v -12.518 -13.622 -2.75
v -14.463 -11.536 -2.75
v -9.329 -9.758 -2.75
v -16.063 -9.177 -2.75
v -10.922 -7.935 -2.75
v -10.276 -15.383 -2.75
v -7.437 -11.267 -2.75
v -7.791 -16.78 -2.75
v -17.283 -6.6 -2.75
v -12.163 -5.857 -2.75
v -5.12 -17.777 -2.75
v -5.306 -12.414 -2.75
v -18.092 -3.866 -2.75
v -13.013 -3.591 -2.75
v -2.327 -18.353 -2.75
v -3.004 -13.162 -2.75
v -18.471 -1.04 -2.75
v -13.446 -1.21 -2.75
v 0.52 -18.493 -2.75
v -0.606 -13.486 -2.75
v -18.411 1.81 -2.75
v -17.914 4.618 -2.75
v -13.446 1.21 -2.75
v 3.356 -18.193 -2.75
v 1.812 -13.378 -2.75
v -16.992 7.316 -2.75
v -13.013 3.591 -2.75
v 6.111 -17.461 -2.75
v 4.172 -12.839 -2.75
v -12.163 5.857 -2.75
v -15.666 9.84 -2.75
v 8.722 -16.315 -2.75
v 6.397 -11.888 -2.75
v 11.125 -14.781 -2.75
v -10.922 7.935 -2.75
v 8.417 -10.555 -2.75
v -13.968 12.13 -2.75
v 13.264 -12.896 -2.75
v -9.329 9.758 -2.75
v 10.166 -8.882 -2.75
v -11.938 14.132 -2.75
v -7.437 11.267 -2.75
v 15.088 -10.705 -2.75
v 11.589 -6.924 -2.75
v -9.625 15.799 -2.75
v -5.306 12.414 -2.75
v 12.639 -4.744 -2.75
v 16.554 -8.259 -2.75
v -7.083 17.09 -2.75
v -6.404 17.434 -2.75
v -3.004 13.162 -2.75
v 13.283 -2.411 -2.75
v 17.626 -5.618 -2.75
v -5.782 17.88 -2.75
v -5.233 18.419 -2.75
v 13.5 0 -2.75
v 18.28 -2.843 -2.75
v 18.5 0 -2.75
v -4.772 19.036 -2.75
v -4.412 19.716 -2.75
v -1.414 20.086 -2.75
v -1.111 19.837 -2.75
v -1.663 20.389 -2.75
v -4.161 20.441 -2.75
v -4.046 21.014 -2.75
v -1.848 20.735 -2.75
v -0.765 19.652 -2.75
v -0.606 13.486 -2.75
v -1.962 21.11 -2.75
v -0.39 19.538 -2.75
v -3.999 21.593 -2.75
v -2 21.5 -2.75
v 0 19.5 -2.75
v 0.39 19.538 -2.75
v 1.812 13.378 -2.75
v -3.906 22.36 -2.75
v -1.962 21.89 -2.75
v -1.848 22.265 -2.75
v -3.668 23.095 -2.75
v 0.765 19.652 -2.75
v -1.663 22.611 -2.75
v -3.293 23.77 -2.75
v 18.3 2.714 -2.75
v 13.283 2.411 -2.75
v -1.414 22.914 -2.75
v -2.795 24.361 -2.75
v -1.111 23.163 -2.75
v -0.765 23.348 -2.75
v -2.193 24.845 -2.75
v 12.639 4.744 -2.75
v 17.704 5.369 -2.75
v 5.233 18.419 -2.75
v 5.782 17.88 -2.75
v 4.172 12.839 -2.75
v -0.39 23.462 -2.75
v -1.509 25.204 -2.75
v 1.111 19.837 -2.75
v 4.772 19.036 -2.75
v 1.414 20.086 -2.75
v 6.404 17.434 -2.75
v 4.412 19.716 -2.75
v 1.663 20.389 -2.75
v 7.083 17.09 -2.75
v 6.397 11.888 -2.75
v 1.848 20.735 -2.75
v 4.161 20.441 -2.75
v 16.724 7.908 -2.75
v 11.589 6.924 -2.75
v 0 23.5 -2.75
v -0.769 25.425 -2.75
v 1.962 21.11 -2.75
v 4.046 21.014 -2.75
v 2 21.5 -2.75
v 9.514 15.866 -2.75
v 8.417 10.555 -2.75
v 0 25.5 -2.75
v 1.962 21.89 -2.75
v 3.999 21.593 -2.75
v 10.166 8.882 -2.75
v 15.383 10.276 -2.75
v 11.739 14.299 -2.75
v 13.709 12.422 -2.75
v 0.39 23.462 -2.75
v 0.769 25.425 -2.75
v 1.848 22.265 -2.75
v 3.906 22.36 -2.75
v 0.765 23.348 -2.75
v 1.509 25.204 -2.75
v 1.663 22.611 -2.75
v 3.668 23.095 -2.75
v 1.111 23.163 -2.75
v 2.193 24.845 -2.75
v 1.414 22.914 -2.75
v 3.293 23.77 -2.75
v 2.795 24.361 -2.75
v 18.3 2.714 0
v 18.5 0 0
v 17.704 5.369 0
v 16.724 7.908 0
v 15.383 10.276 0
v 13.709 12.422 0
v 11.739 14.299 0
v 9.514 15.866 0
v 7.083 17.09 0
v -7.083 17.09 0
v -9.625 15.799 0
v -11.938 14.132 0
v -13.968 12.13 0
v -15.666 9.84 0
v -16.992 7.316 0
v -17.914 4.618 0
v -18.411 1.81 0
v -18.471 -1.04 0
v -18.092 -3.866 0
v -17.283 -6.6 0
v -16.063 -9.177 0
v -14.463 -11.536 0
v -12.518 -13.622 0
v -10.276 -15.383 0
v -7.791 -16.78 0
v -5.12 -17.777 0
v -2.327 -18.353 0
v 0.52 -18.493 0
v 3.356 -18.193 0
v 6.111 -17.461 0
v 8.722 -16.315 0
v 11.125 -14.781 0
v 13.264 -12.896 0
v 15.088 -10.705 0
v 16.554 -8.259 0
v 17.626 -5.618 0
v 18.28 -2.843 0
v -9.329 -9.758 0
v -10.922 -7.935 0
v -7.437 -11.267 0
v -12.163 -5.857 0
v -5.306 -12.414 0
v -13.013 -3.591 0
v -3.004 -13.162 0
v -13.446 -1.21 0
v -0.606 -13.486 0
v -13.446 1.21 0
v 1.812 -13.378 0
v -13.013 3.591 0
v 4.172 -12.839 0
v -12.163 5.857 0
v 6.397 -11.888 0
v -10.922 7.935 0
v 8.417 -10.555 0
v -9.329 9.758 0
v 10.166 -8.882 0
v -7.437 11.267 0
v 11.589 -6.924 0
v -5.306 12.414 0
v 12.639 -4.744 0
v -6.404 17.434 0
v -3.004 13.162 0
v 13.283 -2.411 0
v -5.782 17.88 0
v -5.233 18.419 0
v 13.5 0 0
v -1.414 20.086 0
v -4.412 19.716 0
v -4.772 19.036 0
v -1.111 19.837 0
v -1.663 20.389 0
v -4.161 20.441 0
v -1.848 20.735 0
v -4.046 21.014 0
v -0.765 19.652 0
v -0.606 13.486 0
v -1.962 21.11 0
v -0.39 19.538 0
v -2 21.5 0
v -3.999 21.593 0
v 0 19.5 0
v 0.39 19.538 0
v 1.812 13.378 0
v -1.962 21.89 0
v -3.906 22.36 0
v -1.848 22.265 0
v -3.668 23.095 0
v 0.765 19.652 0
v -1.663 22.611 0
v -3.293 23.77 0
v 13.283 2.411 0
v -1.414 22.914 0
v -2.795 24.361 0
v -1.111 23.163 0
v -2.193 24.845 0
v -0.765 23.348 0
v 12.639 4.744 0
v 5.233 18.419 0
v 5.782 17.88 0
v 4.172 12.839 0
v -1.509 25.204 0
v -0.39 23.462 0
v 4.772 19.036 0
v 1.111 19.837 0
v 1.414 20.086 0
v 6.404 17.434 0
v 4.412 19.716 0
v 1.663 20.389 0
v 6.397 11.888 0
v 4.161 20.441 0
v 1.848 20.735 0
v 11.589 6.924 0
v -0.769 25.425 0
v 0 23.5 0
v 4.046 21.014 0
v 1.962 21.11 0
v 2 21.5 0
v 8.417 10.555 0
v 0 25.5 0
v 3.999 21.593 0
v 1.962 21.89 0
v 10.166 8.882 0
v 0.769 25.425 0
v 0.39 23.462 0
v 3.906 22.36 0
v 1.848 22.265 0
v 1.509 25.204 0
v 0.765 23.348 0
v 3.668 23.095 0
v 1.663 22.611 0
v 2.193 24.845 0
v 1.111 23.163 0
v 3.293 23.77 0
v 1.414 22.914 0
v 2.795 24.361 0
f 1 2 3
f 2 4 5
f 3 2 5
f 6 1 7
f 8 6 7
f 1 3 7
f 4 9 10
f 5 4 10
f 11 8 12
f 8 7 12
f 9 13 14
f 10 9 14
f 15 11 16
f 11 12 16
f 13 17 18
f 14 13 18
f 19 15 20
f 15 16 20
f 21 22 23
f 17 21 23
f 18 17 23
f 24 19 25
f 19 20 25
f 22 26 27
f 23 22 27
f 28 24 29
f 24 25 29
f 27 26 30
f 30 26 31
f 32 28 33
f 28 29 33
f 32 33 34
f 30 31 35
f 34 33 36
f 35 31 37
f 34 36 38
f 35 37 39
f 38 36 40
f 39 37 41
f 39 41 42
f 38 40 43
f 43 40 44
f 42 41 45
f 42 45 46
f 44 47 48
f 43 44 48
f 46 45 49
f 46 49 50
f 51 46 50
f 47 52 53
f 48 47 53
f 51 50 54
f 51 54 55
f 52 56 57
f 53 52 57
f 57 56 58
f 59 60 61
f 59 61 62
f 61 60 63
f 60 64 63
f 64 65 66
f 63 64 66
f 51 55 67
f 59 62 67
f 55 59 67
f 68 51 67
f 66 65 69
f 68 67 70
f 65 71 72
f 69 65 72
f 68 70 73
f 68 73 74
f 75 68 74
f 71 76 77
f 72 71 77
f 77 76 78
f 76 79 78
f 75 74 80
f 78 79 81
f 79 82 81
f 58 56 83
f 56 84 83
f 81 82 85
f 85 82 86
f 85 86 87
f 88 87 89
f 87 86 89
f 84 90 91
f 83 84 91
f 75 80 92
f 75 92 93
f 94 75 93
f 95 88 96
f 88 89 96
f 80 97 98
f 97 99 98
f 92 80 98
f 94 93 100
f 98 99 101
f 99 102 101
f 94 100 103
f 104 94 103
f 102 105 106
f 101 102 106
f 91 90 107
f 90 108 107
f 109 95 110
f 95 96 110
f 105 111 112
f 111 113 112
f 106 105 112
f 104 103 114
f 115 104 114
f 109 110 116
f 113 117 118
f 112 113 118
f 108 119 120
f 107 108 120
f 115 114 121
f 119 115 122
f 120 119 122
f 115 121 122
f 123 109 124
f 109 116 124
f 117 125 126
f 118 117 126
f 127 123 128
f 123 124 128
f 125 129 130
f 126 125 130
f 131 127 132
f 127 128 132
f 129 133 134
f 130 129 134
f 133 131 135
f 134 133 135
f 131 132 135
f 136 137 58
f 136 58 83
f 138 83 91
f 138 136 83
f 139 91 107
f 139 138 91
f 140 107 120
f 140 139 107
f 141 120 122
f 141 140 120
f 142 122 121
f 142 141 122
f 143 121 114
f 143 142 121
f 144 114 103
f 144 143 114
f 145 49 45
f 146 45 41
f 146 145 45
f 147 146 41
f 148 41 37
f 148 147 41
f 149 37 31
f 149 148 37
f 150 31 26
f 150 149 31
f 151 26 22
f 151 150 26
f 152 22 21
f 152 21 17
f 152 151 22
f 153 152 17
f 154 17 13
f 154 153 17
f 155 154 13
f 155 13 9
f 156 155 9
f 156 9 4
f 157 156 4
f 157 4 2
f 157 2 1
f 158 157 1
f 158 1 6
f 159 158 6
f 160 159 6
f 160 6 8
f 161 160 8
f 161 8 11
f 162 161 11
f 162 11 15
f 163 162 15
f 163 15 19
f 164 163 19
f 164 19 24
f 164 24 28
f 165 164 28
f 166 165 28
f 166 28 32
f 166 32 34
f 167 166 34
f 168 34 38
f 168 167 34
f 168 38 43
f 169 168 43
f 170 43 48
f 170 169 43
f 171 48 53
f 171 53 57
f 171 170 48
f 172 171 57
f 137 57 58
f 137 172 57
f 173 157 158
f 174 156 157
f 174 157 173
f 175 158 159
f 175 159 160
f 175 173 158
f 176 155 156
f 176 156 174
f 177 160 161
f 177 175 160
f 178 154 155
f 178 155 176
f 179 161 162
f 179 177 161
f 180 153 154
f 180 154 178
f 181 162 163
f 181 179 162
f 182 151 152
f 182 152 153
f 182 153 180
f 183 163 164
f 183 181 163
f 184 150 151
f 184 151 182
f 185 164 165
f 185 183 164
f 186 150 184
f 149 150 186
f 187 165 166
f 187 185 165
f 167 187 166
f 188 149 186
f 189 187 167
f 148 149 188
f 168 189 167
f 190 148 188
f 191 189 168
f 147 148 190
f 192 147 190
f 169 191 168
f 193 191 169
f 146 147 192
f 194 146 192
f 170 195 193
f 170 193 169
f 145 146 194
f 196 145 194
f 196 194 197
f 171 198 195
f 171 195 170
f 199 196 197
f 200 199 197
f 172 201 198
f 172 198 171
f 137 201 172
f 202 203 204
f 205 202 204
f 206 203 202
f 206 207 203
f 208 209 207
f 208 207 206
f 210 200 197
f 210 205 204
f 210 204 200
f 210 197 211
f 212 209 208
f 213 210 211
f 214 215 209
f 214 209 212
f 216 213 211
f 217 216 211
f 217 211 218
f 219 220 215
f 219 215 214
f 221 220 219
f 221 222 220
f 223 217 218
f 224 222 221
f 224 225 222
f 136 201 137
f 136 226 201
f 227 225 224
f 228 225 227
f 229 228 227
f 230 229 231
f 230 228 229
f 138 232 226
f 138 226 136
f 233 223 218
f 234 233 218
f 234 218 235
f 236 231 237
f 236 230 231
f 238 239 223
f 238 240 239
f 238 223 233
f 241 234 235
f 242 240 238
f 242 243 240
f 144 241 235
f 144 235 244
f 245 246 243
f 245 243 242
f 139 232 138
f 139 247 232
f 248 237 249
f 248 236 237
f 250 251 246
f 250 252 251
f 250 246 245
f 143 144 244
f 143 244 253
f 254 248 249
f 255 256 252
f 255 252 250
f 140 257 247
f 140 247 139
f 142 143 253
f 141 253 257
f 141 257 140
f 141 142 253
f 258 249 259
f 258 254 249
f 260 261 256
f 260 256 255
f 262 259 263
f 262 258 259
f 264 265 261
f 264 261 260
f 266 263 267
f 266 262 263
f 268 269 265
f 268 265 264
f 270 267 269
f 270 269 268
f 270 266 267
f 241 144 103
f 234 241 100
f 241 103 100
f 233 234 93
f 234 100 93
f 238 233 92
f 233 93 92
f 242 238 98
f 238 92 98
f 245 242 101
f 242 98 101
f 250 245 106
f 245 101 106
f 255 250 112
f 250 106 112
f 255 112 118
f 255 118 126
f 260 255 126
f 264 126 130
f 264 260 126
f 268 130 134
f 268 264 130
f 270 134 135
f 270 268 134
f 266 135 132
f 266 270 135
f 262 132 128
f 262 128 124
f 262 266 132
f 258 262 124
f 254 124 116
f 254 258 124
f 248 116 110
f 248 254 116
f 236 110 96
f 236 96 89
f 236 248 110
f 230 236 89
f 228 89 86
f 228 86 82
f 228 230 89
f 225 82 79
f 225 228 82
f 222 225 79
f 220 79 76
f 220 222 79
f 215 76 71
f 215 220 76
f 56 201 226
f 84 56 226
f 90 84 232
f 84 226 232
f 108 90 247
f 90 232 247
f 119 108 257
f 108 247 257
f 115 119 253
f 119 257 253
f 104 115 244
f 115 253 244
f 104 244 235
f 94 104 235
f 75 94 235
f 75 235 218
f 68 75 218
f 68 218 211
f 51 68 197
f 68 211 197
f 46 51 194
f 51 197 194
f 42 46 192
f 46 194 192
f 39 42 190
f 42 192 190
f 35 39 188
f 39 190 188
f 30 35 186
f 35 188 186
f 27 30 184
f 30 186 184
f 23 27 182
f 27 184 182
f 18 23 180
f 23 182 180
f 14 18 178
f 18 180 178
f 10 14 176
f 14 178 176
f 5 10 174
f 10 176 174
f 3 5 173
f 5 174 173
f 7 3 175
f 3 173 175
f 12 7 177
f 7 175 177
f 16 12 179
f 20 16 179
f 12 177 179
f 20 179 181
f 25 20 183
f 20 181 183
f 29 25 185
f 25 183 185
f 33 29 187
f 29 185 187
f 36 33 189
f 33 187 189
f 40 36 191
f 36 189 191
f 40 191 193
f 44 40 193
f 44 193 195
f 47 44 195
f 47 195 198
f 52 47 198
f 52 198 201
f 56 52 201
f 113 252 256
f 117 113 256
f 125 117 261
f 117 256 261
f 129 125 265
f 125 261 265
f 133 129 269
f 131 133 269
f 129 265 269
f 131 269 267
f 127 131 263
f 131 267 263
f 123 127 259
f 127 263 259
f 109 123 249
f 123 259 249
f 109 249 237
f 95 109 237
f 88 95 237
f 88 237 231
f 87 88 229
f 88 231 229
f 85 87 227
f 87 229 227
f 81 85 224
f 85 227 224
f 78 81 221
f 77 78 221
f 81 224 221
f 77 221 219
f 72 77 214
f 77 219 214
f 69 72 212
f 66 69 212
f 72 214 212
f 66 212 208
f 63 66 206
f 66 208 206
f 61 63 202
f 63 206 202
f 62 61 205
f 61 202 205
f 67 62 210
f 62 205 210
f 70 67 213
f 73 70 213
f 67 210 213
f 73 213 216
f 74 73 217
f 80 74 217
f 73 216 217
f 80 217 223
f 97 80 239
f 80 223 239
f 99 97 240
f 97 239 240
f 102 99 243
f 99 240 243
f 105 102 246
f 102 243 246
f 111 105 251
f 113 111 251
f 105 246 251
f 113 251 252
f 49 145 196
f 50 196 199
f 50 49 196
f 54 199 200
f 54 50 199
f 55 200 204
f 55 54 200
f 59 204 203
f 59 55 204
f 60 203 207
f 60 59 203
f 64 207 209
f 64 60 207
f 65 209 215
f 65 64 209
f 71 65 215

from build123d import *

# Parameters (mm, degrees)
F0_R     = 13.5
F0_R_2   = 2
F1_DEPTH = 2.75
F2_R     = 5


with BuildPart() as f1:
    # F0 (on Top) → F1 (new body)
    with BuildSketch(Plane.XY):
        with BuildLine():
            ThreePointArc((-4, 18.0623918682), (-11.5812348219, -14.4265380463), (18.5, 0))
            ThreePointArc((18.5, 0), (14.4265380463, 11.5812348219), (4, 18.0623918682))
            ThreePointArc((4, 18.0623918682), (3.2273401507, 18.2163189353), (2.4488272709, 18.3372093023))
            ThreePointArc((2.4488272709, 18.3372093023), (0, 17.5), (-2.4488272709, 18.3372093023))
            ThreePointArc((-2.4488272709, 18.3372093023), (-3.2273401507, 18.2163189353), (-4, 18.0623918682))
        make_face()
        Circle(F0_R, mode=Mode.SUBTRACT)
        with BuildLine():
            ThreePointArc((-2.4488272709, 18.3372093023), (0, 17.5), (2.4488272709, 18.3372093023))
            ThreePointArc((2.4488272709, 18.3372093023), (0, 18.5), (-2.4488272709, 18.3372093023))
        make_face()
        with BuildLine():
            ThreePointArc((-2.4488272709, 18.3372093023), (0, 18.5), (2.4488272709, 18.3372093023))
            ThreePointArc((2.4488272709, 18.3372093023), (3.5913304696, 19.7386523744), (4, 21.5))
            ThreePointArc((4, 21.5), (0, 25.5), (-4, 21.5))
            ThreePointArc((-4, 21.5), (-3.5913304696, 19.7386523744), (-2.4488272709, 18.3372093023))
        make_face()
        with Locations((0, 21.5)):
            Circle(F0_R_2, mode=Mode.SUBTRACT)
        with BuildLine():
            ThreePointArc((2.4488272709, 18.3372093023), (3.2273401507, 18.2163189353), (4, 18.0623918682))
            Line((4, 18.0623918682), (4, 21.5))
            ThreePointArc((4, 21.5), (3.5913304696, 19.7386523744), (2.4488272709, 18.3372093023))
        make_face()
        with BuildLine():
            Line((-4, 21.5), (-4, 18.0623918682))
            ThreePointArc((-4, 18.0623918682), (-3.2273401507, 18.2163189353), (-2.4488272709, 18.3372093023))
            ThreePointArc((-2.4488272709, 18.3372093023), (-3.5913304696, 19.7386523744), (-4, 21.5))
        make_face()
    extrude(amount=-F1_DEPTH)

    # F2
    f2_edges = [f1.edges().sort_by_distance(p)[0] for p in [
        (4, 18.062392, -1.375),
        (-4, 18.062392, -1.375),
    ]]
    fillet(f2_edges, radius=F2_R)


solid = f1.part
